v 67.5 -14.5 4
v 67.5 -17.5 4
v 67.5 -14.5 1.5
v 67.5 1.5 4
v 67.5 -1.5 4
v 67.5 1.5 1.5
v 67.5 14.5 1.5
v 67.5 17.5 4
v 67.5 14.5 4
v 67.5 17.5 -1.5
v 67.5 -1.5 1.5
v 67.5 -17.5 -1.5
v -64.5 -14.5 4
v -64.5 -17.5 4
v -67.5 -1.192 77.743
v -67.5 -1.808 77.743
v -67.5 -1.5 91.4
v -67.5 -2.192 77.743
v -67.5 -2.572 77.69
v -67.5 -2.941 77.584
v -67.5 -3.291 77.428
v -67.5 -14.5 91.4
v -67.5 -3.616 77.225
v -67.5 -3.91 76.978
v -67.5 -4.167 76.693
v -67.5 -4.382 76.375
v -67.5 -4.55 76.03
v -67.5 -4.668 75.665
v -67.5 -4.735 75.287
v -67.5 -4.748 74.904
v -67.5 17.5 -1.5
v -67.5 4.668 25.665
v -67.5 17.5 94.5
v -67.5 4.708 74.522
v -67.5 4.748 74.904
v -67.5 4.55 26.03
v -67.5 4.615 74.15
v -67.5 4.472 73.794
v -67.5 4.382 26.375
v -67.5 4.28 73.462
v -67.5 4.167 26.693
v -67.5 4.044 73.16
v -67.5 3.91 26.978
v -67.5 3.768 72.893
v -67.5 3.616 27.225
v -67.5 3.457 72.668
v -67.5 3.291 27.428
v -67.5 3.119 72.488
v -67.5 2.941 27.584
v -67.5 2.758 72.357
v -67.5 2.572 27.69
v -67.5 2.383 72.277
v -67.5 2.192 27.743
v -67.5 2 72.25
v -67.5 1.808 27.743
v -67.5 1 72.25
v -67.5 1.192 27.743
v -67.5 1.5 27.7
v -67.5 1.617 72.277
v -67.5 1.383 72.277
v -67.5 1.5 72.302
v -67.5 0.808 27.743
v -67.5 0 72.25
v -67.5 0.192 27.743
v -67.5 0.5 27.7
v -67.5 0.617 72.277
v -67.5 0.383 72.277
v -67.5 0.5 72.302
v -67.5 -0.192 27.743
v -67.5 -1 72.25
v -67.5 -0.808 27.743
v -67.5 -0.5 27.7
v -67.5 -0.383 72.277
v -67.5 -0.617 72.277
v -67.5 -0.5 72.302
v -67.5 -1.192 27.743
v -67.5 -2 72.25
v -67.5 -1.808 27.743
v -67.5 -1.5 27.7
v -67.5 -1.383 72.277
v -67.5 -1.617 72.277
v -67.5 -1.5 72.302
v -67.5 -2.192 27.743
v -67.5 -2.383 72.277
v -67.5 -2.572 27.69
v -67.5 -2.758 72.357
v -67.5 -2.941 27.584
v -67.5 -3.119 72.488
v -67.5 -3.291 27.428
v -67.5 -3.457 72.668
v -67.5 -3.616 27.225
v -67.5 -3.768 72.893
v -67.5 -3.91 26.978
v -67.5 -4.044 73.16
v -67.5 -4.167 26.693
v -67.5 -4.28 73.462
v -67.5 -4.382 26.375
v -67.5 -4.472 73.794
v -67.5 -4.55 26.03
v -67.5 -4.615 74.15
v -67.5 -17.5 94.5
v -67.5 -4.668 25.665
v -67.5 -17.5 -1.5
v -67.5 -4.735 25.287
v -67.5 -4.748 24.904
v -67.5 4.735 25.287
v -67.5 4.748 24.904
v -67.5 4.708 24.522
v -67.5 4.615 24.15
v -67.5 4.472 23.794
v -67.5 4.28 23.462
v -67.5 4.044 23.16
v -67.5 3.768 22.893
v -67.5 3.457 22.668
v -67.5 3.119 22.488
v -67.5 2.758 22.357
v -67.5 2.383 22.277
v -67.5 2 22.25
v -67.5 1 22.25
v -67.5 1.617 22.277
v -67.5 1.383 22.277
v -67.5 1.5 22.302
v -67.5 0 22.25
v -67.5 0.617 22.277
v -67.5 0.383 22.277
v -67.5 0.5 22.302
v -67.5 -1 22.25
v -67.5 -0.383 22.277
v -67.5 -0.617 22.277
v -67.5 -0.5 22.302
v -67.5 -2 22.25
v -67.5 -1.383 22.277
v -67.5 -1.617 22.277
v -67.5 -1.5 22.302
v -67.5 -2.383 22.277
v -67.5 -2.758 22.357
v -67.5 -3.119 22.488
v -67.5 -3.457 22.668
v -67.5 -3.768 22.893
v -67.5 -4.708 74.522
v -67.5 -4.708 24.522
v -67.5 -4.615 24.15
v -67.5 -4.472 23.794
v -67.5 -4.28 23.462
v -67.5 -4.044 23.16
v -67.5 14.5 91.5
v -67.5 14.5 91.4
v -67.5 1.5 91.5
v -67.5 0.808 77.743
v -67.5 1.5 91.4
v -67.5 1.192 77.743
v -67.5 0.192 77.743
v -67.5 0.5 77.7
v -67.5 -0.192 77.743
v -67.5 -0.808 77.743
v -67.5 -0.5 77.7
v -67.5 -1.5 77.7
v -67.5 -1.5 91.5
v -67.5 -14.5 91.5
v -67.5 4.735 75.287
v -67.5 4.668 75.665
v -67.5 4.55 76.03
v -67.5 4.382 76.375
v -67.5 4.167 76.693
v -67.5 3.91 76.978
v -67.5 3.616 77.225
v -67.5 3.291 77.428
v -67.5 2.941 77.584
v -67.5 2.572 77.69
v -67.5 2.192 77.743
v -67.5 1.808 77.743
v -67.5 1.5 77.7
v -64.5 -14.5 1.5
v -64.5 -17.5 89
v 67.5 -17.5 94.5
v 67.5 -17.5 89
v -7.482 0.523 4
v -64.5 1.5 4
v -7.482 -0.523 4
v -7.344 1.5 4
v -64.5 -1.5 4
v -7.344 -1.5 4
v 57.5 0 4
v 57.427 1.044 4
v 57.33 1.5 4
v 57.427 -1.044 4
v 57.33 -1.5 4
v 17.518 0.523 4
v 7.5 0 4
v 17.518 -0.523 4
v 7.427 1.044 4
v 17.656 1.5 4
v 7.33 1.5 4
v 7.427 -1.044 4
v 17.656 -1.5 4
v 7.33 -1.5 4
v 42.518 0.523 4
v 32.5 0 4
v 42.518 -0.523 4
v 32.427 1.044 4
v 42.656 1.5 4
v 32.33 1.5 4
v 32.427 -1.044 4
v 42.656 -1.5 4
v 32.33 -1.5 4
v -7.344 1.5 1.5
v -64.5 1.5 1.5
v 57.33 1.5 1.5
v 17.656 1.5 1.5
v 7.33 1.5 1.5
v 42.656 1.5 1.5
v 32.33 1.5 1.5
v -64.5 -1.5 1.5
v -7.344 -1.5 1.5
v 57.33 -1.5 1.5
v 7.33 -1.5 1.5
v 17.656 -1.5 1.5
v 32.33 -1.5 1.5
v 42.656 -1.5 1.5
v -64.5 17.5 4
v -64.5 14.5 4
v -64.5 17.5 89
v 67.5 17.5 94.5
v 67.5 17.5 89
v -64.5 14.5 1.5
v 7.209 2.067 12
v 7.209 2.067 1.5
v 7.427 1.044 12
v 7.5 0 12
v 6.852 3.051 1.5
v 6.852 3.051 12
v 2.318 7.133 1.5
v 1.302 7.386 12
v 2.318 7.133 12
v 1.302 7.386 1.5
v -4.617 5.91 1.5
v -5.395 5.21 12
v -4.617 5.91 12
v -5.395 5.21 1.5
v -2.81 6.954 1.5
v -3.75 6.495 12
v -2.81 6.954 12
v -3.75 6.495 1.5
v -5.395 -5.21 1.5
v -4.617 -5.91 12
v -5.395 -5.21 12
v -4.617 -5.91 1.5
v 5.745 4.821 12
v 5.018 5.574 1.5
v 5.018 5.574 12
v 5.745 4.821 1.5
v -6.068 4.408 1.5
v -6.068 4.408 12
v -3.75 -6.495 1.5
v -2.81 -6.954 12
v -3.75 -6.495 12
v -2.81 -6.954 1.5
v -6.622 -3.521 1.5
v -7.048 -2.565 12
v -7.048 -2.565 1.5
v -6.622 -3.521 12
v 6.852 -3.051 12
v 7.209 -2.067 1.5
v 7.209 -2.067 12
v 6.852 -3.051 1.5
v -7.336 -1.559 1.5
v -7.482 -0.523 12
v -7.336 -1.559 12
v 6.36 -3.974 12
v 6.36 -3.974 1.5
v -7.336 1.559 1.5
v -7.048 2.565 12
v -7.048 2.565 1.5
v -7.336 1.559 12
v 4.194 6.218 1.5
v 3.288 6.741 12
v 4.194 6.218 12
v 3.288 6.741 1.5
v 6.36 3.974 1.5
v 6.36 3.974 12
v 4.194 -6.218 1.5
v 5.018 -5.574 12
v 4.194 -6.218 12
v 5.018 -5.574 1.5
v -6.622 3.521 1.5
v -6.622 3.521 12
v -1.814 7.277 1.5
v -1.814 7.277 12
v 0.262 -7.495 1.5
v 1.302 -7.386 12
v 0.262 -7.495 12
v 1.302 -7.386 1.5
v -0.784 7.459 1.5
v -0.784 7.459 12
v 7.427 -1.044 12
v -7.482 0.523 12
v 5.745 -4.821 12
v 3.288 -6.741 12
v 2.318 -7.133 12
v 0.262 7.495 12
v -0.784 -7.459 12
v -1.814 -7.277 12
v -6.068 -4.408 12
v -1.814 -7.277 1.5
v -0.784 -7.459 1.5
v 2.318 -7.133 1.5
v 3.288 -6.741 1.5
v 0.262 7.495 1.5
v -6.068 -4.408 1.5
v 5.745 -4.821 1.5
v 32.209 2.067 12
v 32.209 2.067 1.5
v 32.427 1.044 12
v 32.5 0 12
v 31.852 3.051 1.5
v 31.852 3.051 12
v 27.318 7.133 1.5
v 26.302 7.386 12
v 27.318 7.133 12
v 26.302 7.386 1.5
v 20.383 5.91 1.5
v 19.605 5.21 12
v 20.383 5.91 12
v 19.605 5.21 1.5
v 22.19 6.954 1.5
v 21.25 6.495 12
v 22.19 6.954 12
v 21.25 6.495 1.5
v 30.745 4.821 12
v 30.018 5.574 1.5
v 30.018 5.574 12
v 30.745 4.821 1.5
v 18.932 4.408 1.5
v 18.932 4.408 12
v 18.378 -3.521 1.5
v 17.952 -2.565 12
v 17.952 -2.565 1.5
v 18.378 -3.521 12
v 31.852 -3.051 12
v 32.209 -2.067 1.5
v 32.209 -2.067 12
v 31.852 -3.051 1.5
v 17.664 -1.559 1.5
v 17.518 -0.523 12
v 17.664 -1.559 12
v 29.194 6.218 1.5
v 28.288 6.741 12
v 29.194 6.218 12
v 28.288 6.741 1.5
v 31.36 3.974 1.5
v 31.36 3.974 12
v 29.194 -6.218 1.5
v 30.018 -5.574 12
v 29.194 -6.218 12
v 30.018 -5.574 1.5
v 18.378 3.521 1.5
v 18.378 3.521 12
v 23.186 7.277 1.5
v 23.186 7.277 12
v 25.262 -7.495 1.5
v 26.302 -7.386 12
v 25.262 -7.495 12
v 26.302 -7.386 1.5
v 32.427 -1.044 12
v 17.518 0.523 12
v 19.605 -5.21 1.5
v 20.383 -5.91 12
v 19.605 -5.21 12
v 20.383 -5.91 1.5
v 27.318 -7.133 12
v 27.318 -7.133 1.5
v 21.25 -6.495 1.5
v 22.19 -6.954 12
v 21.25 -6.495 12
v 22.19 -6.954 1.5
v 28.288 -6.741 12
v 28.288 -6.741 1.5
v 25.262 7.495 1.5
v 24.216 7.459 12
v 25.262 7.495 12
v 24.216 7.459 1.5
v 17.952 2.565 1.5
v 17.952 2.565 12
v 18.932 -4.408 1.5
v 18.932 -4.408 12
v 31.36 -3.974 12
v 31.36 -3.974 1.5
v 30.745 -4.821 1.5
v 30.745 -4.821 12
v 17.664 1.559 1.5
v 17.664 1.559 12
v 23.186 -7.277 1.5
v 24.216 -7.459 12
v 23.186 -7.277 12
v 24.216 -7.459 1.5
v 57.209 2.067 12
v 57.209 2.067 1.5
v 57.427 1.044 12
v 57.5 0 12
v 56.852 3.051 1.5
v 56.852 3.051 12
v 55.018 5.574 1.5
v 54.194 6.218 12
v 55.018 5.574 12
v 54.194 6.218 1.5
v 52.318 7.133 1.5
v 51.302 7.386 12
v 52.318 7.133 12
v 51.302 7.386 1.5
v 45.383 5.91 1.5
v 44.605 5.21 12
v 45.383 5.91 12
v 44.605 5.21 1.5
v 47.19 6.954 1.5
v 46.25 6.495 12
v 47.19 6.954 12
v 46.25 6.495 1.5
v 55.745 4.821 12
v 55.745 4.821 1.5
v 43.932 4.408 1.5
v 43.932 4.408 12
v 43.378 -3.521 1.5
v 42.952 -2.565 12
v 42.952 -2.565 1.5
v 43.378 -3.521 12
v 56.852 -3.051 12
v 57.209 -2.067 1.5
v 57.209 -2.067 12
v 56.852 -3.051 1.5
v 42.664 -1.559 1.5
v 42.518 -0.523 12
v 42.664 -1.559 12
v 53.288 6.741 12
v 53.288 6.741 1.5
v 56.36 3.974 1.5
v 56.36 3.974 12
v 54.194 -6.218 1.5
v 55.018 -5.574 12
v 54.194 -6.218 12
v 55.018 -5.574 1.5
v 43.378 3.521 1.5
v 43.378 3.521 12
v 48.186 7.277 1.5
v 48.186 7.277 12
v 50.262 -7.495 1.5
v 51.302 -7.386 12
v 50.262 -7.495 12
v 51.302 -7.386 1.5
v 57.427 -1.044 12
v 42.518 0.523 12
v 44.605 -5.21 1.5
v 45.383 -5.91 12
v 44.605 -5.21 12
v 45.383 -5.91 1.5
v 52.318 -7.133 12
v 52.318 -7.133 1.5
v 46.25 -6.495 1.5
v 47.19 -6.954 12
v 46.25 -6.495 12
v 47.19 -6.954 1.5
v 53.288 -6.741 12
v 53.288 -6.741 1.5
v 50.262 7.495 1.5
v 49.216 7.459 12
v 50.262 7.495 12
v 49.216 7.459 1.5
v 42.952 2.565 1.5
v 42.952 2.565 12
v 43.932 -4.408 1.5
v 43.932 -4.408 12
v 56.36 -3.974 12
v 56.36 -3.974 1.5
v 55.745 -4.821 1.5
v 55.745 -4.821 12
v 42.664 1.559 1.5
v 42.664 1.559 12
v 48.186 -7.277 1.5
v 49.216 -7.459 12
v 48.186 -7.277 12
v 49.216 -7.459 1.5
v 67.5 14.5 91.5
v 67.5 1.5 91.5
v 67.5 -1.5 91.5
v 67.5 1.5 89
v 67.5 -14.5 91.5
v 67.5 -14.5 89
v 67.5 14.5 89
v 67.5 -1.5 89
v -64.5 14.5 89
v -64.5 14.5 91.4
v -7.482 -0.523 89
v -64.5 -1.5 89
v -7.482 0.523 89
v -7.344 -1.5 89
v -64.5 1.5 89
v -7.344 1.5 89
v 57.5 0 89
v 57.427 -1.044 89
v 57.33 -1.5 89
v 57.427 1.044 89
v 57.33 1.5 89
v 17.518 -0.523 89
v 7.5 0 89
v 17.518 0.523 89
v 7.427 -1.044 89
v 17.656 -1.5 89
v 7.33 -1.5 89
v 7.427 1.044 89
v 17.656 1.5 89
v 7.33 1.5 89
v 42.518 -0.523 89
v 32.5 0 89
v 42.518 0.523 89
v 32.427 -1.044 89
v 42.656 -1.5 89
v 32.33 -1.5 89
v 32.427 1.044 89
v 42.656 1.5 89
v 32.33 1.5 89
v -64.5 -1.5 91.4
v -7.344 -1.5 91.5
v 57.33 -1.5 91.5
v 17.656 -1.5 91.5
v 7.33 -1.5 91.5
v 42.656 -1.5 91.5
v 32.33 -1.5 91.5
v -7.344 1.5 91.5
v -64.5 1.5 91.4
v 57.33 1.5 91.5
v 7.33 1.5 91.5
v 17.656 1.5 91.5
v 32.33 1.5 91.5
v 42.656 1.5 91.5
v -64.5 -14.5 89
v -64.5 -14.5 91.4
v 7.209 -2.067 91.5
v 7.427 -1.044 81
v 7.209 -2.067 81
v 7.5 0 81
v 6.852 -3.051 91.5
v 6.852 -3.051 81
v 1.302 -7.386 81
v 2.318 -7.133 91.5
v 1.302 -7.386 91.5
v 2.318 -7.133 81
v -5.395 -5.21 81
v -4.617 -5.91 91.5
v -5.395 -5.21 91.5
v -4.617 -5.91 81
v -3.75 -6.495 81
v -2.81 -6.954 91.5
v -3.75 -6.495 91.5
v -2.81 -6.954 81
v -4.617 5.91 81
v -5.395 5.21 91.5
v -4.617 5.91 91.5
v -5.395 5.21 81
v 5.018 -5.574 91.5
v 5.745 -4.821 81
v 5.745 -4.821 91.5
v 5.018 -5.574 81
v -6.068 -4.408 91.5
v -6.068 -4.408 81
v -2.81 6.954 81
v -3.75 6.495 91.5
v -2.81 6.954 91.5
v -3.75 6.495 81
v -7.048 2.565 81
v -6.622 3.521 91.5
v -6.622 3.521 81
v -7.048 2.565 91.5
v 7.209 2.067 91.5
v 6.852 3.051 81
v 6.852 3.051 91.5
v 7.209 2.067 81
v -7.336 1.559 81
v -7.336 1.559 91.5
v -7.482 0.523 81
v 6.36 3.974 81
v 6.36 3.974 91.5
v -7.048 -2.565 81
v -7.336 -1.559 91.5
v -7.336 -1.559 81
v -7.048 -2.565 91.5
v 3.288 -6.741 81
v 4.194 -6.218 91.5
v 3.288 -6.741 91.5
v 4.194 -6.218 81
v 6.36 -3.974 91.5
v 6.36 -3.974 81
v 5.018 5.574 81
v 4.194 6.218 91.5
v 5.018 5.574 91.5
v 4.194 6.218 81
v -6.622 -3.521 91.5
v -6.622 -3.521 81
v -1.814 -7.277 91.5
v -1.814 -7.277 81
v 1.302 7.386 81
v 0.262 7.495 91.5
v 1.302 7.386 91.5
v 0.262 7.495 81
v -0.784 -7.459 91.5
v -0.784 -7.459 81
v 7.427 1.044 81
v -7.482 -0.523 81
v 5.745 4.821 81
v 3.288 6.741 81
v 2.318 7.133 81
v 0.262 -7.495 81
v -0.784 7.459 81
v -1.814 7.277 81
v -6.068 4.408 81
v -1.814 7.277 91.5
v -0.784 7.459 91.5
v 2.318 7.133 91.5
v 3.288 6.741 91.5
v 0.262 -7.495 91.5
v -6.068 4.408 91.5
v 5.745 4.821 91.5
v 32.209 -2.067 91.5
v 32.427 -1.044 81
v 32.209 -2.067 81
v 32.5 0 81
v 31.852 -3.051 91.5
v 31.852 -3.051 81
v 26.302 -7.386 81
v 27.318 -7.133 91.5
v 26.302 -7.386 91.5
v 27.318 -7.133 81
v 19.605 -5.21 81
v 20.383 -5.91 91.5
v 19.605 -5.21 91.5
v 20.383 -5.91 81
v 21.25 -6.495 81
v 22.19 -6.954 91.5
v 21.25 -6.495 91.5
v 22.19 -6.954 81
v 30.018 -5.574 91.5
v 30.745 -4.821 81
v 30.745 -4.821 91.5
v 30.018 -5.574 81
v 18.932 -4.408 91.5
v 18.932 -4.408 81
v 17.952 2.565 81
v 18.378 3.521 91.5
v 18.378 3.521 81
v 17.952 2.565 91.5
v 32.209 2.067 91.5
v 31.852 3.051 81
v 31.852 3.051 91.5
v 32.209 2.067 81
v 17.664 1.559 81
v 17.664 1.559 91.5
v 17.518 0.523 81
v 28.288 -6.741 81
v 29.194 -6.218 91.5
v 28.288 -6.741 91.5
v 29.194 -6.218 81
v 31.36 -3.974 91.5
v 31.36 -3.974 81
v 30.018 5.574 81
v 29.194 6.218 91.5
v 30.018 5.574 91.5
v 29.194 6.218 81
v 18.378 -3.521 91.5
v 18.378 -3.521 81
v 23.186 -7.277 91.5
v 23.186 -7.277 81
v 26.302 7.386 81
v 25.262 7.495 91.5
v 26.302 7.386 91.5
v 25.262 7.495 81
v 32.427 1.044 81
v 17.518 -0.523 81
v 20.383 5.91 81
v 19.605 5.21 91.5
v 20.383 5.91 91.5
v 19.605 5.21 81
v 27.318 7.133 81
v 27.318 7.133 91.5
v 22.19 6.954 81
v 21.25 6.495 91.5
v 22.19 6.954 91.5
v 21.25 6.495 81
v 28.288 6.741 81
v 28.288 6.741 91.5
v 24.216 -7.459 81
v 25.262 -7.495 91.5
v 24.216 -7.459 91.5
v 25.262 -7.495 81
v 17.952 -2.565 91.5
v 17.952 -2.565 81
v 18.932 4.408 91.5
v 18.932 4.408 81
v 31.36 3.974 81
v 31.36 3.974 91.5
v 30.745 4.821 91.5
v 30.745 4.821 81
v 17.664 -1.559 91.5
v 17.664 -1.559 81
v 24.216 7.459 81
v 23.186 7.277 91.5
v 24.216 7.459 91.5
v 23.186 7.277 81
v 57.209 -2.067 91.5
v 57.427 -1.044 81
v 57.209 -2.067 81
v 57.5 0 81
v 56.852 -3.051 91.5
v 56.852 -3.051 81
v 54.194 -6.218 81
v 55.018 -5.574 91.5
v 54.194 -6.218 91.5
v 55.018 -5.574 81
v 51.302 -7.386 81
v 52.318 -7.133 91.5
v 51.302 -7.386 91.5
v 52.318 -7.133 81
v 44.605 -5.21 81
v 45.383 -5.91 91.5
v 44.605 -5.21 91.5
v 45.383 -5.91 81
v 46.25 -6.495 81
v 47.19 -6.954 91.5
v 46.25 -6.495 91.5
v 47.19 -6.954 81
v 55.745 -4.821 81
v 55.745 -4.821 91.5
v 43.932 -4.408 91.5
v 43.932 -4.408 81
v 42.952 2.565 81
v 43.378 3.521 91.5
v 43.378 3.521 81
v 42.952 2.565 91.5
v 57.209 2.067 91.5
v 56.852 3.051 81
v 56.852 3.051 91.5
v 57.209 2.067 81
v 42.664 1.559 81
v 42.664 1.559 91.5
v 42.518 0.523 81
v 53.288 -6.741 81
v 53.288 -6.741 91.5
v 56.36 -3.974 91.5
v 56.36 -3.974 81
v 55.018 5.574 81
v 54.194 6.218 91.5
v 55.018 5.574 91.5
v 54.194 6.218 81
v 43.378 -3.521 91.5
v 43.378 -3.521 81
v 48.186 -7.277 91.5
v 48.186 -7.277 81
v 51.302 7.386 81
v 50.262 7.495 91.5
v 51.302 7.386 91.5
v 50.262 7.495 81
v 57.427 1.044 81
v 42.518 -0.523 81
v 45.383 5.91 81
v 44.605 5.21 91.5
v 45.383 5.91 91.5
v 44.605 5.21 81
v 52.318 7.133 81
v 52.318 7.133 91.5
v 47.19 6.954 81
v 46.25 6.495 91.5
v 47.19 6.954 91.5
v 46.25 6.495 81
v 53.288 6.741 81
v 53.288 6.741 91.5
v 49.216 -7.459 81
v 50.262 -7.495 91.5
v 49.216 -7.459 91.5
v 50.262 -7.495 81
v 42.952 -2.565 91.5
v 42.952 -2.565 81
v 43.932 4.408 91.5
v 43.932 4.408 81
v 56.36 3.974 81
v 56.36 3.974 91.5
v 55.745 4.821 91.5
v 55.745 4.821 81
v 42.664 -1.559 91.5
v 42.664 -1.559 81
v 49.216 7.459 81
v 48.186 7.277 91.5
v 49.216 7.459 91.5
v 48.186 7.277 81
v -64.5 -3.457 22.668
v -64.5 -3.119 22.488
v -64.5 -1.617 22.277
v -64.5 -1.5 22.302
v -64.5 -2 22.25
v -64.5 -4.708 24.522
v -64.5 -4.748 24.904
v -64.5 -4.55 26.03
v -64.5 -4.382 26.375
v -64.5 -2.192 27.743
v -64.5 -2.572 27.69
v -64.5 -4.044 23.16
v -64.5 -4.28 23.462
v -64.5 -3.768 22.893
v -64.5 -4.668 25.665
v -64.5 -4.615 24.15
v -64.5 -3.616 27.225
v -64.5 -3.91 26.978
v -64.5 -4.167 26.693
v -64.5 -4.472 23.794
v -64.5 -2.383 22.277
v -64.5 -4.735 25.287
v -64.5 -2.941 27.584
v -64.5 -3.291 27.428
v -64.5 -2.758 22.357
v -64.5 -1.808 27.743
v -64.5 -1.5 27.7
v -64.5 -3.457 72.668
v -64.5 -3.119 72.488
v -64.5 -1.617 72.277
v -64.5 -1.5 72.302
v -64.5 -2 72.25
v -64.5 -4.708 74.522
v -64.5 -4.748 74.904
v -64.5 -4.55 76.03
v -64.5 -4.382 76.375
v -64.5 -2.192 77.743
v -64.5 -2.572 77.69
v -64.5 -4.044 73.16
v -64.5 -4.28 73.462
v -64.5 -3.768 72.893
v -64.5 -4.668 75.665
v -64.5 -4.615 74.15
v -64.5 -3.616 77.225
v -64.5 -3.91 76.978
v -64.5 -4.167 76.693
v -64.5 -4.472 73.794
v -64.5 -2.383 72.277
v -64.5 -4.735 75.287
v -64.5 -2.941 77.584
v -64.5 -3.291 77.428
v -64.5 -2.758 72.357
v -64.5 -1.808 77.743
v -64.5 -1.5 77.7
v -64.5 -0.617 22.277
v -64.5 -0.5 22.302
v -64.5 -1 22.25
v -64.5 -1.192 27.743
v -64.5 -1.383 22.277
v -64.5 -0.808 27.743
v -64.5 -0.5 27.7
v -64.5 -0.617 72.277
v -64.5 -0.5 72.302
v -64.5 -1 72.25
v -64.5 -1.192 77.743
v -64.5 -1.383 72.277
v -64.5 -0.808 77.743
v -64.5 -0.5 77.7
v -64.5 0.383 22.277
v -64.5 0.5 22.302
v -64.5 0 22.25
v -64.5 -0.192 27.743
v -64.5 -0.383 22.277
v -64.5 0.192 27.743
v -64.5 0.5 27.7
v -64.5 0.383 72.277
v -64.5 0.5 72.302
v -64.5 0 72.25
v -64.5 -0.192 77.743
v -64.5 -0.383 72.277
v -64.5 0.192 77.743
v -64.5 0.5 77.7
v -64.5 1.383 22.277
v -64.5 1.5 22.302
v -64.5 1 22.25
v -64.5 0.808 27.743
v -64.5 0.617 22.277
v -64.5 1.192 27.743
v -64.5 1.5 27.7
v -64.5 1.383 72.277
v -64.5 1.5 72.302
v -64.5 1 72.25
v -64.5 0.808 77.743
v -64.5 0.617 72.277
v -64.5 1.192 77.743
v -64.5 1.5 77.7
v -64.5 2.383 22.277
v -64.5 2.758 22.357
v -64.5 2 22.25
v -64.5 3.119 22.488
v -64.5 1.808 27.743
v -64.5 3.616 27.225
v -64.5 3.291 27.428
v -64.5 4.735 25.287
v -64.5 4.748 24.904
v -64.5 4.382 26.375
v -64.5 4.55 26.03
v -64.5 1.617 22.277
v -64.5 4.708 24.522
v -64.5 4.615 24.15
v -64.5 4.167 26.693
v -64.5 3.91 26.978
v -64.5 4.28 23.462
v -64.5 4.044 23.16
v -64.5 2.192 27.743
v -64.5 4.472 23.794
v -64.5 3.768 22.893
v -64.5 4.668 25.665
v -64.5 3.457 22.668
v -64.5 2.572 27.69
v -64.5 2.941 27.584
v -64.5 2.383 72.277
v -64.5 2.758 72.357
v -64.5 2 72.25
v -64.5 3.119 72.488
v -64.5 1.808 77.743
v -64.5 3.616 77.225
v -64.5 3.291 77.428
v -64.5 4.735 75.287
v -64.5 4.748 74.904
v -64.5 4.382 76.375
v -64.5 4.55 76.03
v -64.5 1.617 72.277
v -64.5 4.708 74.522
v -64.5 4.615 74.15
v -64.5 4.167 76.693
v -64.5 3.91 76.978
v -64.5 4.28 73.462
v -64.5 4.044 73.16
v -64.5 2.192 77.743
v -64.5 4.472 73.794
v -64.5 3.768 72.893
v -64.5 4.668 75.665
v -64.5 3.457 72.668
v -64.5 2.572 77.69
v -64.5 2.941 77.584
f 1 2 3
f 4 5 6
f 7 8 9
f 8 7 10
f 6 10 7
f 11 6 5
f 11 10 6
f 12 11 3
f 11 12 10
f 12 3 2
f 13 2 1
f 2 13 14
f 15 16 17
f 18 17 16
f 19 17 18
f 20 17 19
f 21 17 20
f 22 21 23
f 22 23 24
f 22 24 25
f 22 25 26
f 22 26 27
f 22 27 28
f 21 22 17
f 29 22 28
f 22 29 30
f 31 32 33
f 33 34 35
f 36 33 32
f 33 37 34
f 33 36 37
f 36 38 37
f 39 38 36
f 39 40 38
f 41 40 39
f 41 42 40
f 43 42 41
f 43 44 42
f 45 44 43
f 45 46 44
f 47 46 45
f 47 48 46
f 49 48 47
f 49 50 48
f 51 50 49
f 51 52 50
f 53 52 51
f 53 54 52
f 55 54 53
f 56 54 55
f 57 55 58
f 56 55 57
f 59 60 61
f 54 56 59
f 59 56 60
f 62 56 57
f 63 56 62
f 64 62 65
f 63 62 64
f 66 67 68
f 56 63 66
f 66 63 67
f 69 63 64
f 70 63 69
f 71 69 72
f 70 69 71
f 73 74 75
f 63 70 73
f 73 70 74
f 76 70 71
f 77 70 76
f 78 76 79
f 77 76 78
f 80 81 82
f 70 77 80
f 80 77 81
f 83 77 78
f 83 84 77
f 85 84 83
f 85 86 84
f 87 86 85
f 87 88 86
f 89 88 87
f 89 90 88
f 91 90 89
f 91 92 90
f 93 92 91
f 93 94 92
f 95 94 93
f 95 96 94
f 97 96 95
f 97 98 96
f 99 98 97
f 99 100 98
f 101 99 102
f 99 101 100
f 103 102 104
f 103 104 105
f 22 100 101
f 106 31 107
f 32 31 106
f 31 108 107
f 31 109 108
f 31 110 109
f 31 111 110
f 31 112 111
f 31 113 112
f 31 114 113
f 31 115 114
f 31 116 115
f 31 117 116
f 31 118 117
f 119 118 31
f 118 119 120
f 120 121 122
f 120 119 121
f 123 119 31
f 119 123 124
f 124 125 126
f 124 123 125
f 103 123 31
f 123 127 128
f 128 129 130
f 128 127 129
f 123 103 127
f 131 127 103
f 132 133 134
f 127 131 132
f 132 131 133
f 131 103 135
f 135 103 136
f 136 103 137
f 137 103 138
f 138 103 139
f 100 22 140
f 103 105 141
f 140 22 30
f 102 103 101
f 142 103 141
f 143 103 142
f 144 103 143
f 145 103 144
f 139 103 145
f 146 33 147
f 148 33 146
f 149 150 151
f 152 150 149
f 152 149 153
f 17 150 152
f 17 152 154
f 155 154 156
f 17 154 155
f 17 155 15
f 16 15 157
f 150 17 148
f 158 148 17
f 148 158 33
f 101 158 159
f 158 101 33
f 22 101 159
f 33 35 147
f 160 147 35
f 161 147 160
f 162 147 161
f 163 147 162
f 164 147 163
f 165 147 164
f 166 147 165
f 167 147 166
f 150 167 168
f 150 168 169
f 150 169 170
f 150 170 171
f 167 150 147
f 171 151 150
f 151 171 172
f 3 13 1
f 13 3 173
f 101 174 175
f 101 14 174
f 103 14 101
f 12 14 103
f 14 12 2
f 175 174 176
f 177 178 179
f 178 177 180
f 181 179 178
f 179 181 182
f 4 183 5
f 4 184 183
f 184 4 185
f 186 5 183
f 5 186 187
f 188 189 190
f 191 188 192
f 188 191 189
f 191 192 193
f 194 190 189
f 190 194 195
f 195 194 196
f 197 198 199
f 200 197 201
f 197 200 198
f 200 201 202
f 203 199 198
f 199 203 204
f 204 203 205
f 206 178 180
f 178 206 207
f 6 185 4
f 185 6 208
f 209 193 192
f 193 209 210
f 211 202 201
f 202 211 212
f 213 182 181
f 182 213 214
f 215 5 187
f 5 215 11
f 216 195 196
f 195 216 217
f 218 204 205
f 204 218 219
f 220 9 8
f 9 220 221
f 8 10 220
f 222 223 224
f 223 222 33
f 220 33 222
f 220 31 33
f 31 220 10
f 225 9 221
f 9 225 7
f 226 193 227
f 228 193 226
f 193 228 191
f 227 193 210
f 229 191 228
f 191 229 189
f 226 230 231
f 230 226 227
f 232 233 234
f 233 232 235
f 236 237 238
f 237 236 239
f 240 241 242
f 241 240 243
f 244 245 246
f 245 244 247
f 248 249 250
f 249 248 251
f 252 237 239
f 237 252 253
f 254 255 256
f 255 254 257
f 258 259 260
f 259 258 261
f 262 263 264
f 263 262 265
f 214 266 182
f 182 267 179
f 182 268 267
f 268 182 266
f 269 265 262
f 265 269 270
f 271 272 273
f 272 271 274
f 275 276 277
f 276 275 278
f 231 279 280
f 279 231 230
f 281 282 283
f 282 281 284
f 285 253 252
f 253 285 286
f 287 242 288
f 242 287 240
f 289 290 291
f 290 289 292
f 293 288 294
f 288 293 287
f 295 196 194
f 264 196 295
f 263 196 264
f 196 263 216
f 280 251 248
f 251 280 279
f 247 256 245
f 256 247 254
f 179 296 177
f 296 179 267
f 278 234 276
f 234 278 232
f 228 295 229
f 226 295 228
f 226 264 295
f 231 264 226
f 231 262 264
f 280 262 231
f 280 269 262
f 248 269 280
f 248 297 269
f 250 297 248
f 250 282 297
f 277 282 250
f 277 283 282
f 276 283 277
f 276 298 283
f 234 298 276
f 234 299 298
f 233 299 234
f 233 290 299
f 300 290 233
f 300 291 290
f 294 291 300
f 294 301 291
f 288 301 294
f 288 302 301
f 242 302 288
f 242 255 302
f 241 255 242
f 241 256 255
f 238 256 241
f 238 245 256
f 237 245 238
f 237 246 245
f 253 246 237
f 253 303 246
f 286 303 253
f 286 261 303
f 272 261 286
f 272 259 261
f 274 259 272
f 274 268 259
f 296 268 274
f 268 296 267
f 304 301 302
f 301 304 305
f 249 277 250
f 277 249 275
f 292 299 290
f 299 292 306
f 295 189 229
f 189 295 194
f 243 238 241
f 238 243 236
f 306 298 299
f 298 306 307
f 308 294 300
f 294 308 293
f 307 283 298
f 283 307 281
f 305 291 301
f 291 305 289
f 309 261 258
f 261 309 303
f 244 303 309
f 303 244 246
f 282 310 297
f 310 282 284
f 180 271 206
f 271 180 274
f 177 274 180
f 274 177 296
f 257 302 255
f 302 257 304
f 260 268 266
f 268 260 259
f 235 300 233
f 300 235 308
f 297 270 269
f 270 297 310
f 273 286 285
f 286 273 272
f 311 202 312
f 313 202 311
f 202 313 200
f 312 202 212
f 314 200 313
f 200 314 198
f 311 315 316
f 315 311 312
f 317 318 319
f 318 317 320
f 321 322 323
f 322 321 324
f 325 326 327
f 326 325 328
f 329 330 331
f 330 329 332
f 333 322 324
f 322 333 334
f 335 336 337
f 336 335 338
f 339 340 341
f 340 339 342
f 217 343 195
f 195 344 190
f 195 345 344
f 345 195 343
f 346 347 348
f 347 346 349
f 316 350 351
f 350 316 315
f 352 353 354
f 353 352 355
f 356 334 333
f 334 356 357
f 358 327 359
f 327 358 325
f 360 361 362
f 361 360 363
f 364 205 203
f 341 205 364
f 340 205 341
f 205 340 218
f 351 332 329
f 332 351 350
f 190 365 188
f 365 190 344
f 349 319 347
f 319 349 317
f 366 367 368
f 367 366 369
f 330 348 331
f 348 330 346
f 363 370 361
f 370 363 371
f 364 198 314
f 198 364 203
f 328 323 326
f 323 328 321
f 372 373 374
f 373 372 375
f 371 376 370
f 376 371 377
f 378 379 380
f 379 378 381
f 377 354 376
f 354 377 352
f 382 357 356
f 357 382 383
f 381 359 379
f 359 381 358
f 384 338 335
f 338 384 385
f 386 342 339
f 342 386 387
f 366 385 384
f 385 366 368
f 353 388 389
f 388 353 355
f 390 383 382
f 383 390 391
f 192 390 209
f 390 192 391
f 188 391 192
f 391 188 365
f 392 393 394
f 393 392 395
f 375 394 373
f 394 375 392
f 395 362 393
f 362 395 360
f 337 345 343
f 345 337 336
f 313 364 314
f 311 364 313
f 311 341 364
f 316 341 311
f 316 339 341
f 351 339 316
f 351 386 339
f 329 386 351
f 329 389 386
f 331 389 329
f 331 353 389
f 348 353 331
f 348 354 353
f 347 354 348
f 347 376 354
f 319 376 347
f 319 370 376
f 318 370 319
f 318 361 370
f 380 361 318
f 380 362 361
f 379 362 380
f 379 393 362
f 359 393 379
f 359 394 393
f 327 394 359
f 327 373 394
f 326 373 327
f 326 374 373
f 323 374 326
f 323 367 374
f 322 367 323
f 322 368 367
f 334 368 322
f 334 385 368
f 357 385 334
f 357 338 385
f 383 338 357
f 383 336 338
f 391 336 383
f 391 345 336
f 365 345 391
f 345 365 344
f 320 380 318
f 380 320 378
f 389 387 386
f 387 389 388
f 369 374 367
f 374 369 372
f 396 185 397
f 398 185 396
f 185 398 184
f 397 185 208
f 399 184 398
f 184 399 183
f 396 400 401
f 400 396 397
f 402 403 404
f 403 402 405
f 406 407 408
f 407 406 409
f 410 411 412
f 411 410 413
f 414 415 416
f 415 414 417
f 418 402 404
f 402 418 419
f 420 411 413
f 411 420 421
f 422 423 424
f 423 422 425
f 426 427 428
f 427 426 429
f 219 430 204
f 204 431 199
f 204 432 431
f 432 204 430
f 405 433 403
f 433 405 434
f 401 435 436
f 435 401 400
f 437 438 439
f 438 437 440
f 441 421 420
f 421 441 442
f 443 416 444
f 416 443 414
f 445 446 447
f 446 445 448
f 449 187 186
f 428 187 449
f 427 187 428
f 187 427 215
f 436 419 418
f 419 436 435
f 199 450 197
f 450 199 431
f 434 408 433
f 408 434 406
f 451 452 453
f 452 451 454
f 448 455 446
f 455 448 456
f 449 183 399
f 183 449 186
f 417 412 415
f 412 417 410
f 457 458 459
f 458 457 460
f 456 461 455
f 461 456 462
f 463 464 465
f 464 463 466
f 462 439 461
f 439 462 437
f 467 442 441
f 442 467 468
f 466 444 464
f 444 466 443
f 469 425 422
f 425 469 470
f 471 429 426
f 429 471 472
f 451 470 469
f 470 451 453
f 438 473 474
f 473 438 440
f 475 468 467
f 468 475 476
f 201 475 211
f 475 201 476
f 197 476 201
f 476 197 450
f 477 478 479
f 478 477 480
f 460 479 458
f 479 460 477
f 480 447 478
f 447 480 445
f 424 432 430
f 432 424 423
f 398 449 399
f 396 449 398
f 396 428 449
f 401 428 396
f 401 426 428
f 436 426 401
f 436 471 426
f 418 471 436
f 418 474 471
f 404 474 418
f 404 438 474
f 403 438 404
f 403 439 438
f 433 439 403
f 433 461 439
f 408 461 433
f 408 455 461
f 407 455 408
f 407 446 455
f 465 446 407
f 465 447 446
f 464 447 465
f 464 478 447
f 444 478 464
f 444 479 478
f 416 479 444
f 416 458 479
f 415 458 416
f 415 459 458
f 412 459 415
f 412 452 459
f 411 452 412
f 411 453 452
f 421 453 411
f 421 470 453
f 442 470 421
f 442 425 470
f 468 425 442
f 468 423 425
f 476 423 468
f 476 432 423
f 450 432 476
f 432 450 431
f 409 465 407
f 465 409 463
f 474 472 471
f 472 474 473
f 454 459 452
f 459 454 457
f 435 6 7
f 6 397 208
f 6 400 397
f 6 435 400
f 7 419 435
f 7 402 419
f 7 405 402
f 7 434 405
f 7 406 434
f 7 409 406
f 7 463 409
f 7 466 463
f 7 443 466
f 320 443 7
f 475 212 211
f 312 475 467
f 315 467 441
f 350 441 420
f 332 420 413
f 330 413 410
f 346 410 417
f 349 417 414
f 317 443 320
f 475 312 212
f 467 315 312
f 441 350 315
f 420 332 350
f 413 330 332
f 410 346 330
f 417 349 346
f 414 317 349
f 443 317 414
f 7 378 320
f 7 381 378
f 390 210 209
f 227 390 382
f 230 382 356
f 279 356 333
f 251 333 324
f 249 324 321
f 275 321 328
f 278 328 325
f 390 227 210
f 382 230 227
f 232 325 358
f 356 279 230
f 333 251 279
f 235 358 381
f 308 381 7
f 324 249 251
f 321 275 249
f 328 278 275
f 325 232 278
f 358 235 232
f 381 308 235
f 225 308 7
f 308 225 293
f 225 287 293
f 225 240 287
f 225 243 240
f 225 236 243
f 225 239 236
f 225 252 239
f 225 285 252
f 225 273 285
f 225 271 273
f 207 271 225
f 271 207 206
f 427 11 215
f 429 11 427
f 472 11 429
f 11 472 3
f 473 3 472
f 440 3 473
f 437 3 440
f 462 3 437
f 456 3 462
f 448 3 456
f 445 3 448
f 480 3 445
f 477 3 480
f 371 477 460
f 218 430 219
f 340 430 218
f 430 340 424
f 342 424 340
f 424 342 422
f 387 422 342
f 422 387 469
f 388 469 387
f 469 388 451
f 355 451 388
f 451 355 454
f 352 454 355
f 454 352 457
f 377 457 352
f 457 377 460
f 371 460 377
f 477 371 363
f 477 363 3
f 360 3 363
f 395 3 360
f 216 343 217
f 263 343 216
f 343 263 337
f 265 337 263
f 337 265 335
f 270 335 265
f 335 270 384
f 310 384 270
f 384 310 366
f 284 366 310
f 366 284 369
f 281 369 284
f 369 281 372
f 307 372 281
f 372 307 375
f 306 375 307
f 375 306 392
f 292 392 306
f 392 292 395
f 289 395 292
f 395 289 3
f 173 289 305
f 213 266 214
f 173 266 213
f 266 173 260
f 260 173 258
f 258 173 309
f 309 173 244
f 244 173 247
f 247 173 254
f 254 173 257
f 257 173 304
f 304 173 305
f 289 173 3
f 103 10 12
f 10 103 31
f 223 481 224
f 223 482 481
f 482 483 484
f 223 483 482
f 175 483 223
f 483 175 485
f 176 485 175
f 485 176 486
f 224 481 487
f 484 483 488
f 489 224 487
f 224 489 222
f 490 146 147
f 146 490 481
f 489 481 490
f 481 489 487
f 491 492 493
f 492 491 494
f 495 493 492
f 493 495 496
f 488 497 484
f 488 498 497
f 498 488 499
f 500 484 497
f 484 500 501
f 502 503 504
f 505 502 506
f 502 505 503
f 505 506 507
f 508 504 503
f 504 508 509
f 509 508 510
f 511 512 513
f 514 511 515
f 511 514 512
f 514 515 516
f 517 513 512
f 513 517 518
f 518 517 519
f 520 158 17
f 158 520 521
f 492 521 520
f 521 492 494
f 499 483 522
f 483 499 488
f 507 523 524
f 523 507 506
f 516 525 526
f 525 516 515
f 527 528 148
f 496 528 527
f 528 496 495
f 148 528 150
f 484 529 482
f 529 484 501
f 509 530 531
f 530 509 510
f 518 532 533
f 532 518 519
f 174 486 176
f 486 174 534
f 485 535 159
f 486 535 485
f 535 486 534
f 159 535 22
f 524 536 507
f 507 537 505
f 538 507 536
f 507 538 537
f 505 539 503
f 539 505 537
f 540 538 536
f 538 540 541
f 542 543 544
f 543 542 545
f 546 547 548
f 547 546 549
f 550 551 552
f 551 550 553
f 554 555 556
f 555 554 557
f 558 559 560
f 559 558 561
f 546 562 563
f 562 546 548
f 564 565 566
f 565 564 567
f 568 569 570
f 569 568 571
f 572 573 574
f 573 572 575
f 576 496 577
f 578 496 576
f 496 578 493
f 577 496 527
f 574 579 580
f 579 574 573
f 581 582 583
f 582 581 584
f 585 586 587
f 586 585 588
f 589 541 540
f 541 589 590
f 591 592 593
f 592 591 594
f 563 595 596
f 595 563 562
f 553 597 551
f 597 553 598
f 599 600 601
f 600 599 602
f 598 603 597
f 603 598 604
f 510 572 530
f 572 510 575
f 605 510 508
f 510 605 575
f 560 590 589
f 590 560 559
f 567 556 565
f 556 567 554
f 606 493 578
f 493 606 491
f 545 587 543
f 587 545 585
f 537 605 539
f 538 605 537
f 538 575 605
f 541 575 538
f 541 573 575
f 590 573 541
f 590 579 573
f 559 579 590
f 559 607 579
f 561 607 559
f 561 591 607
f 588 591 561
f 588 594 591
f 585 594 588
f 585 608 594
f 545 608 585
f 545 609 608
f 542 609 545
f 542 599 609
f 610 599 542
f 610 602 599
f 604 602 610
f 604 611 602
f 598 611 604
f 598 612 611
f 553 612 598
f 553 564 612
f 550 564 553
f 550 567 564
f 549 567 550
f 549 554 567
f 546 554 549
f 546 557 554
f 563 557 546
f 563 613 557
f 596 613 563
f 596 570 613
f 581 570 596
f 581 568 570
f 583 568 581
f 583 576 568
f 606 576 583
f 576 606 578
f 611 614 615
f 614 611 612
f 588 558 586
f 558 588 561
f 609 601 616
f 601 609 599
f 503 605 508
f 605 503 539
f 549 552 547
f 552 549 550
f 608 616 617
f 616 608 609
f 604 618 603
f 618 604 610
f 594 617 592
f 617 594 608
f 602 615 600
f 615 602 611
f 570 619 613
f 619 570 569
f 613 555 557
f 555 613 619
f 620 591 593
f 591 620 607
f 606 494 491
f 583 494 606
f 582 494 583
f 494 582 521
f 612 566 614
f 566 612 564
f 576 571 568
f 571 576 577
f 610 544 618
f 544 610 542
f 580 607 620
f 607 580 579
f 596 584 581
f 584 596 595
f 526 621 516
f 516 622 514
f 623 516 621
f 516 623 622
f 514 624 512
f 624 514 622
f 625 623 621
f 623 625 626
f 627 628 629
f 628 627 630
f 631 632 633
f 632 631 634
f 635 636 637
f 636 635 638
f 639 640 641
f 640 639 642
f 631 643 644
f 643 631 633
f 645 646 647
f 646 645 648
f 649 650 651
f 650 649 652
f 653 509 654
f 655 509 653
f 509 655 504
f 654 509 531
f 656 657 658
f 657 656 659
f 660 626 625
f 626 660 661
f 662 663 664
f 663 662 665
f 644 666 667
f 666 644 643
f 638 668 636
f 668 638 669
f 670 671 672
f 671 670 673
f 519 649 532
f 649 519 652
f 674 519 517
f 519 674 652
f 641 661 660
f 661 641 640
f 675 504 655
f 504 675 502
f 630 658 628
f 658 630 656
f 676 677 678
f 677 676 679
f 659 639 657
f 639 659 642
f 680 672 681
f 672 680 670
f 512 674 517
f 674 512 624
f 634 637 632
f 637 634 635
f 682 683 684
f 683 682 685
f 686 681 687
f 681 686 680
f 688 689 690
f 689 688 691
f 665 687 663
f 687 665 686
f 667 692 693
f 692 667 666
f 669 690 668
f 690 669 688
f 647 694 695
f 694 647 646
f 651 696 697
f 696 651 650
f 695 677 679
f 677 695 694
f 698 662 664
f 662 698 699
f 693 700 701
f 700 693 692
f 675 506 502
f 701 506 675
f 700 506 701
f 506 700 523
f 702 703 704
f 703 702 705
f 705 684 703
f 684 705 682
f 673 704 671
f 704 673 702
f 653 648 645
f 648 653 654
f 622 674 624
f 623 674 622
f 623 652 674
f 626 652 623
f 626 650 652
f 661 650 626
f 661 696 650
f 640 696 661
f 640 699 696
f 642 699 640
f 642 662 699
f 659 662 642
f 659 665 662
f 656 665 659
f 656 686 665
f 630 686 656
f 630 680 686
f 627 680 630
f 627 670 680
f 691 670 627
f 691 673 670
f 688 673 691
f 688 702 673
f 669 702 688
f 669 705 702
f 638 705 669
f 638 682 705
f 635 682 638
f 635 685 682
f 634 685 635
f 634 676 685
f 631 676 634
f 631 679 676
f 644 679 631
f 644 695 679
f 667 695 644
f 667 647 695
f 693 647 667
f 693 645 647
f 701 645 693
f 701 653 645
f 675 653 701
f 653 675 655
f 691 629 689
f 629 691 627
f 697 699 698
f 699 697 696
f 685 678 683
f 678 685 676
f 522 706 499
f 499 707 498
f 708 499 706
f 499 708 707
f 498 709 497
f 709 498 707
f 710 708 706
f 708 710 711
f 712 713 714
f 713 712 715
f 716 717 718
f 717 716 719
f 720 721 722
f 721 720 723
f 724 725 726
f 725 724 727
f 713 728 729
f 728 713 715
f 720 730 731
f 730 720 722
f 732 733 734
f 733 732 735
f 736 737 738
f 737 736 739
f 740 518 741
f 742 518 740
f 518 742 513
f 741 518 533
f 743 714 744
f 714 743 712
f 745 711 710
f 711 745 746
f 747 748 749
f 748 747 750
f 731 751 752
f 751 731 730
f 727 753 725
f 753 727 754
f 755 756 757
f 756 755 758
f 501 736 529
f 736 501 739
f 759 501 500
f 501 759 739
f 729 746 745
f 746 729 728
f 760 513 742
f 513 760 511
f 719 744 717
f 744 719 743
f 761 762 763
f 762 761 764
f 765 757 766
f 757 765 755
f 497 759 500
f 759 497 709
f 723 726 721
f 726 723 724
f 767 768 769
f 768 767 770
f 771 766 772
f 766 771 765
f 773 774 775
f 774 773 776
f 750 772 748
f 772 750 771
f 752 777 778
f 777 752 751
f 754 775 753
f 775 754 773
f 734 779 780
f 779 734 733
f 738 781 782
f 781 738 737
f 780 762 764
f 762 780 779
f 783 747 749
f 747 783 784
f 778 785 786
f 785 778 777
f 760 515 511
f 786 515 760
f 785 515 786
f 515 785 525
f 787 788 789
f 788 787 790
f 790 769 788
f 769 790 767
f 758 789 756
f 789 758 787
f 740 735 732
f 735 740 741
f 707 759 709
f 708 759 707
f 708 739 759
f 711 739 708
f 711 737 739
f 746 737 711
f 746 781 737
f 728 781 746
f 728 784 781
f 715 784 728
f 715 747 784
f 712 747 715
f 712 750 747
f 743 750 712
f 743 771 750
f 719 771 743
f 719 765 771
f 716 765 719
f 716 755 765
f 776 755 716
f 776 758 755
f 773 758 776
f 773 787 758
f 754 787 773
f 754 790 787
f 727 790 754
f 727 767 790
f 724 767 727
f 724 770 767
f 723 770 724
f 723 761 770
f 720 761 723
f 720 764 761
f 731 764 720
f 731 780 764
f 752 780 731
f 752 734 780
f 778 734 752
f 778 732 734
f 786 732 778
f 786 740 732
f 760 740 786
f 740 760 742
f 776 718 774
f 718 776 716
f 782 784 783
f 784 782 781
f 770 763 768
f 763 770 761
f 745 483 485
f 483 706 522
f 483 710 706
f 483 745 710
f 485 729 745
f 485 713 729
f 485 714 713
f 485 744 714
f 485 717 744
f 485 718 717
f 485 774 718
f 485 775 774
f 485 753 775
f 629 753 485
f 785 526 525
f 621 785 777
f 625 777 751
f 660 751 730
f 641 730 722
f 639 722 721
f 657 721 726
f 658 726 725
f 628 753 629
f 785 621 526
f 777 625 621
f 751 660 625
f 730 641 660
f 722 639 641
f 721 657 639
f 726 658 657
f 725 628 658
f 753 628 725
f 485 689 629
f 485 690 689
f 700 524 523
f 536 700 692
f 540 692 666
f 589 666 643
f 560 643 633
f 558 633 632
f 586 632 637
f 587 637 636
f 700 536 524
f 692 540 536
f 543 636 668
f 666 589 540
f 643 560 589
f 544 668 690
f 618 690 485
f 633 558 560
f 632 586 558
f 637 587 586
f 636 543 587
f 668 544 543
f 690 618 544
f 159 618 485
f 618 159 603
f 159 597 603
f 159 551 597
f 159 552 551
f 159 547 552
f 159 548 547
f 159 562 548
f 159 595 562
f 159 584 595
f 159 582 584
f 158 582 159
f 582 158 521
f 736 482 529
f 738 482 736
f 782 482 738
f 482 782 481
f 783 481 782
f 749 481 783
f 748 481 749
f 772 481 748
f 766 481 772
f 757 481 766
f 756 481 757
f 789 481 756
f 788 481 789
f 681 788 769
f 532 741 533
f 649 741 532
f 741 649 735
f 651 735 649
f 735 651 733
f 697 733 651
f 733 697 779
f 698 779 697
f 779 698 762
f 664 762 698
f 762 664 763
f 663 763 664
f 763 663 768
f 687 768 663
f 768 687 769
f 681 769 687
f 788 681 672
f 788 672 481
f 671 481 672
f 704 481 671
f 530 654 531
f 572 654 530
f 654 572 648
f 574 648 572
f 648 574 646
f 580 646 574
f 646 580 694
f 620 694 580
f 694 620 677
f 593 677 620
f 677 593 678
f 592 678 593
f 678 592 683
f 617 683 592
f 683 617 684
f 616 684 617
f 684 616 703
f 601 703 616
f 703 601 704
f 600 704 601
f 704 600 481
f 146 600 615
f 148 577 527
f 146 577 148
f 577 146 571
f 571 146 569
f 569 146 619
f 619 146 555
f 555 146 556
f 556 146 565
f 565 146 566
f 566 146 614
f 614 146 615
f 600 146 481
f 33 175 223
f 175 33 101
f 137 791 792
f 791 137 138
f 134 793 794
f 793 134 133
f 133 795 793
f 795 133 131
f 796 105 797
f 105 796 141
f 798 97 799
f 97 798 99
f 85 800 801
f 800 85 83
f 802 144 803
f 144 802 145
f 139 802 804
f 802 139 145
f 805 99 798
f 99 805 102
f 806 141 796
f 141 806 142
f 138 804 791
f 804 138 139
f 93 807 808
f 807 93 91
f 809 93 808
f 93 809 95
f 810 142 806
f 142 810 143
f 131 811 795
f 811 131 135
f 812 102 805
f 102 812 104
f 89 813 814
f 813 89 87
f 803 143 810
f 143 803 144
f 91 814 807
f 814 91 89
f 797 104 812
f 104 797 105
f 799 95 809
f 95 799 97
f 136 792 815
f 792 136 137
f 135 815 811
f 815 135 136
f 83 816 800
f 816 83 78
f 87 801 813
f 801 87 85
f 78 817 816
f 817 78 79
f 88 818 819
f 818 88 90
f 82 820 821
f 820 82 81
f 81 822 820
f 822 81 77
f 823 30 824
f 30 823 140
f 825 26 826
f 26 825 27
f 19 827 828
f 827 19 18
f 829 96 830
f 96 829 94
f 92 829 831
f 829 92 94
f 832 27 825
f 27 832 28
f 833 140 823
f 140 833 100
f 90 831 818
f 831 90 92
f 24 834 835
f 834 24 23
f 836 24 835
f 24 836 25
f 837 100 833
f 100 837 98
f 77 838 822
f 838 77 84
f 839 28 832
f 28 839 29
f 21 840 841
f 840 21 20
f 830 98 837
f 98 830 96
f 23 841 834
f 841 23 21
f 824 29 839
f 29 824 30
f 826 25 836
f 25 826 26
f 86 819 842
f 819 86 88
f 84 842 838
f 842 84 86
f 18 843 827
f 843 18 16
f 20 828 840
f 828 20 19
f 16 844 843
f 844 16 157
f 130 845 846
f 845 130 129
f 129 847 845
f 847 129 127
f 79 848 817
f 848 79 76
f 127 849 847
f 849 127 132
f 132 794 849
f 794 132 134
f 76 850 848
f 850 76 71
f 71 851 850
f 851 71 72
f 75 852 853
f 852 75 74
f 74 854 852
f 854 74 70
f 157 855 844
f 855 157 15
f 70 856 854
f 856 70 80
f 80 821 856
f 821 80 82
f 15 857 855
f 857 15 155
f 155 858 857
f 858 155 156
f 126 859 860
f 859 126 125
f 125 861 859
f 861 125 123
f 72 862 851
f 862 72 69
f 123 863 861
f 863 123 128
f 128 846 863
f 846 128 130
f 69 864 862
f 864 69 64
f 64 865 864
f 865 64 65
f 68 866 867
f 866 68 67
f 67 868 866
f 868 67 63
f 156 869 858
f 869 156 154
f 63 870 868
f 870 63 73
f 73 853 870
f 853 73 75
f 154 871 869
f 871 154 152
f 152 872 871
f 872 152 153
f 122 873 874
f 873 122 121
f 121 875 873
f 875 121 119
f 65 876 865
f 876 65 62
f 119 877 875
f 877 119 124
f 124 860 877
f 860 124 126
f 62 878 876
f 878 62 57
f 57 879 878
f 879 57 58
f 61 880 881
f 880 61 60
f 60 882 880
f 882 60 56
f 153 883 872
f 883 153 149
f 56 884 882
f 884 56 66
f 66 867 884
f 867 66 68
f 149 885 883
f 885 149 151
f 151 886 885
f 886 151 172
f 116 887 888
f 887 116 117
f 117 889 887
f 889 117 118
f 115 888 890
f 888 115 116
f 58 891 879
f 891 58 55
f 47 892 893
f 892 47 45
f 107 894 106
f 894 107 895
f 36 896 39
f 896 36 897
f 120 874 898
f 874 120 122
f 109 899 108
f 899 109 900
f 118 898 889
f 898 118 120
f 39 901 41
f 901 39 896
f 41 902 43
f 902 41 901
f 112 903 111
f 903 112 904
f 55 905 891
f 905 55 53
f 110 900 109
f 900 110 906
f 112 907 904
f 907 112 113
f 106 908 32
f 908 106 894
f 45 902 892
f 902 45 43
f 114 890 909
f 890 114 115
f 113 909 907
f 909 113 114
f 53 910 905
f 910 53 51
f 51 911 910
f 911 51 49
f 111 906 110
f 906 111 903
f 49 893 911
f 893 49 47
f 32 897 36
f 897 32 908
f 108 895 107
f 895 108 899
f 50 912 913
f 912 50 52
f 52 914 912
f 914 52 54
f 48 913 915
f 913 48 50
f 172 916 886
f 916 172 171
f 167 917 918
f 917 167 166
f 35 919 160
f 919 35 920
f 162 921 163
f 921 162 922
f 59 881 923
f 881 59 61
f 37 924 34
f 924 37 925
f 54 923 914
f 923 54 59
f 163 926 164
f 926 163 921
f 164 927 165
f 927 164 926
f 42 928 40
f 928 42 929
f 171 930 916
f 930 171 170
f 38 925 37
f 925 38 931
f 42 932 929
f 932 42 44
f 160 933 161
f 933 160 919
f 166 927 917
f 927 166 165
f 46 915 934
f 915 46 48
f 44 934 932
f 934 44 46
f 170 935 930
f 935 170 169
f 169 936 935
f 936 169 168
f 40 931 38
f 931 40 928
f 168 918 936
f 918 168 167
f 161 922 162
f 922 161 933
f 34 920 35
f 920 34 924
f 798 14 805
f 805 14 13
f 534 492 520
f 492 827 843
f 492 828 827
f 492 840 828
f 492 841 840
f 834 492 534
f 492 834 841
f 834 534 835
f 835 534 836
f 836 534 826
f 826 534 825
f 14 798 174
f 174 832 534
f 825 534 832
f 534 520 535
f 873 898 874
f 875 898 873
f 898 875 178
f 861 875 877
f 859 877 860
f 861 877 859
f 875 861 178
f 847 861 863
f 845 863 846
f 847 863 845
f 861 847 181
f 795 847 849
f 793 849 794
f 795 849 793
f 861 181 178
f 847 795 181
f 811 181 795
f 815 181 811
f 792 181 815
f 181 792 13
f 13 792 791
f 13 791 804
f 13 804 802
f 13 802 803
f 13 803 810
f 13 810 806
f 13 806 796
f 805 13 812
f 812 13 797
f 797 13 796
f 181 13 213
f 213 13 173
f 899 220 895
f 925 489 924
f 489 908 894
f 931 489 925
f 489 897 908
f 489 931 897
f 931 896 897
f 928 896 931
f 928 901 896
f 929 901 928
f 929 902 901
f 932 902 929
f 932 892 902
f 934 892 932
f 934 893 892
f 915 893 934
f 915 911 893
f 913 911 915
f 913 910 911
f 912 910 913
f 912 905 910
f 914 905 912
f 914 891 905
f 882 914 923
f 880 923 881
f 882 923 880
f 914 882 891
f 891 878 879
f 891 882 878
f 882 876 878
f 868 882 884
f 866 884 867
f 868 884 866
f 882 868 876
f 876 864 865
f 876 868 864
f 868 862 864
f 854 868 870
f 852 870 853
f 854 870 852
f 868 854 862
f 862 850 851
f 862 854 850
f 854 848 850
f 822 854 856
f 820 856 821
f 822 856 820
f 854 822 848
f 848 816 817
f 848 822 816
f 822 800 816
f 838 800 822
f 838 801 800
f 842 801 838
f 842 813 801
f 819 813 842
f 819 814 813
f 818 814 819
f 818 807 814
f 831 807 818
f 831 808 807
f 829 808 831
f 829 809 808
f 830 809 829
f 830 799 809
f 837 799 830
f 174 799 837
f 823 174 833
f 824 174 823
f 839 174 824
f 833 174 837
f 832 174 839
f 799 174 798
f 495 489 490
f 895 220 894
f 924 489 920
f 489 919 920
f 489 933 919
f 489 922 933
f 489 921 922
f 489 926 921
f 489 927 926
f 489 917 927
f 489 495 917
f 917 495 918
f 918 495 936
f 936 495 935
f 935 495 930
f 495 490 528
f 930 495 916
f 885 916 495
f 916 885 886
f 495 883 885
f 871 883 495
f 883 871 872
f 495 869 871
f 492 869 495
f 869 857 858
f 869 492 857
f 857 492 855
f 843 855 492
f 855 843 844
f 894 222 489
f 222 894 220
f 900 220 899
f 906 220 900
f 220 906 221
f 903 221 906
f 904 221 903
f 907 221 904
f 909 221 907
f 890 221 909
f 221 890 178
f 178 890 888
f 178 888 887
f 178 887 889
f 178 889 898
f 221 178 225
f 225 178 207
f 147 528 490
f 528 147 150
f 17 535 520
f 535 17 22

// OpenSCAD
// generally, how thick will the bracket be?
thickness = 3;



hanging_height = 135;
hanging_width = 90;

mounting_bracket_width = 90;
mounting_bracket_length = 35;
mounting_bracket_hole_diameter = 5.5;
mounting_bracket_hole_pos_1 = 25;
mounting_bracket_hole_pos_2 = 75;

container_width = 100;

spindle_diameter = 20;
spindle_clearance = 5;  // fudge factor to adjust clearance of spindle with sides

// TOTAL spindle length, straight and angled parts
spindle_length = container_width - thickness - spindle_clearance;

spindle_angled_part_height = 7;  // angled bits of the spindle

sdheight = spindle_diameter/3;


spindle_mount_diameter = 15;
spindle_mount_height = 12; // more like 15!
spindle_mount_step = 25;

/*
 *  A spool holder to use in a dry box made from
 *
 *  "ME.FAN EXTRA LARGE Cereal Storage Containers 
 *  [Set of 2] Airtight Food Storage Containers 
 *  6.3L(213oz) - Large Kitchen Storage Keeper 
 *  with 24 Chalkboard Labels & Pen - Easy 
 *  Pouring Lid (Blue)" 
 *
 *  https://www.amazon.com/gp/product/B085ZBCLLN
 *  (As of 8/29/2020)
 *
 *  Dimensions are roughly 
 *  11 inches x 11.2 inches x 3.94 inches
 *
 *  Dry box parts will all mount into the lid to make
 *  it more convenient to interchange spools.
 *
 */
module hangingSpoolHolder() {
    module spindleMount() {
        translate([0,0,spindle_mount_height/2])
        cylinder(d=spindle_mount_diameter,
            h=spindle_mount_height,
            center=true);
    }
    
    // The part that hangs down into the container
    module hangingPart() {
        cube([hanging_height,mounting_bracket_length,thickness], center=true);
        mbl2 = mounting_bracket_length/2;
        hh = sdheight*0.7;
        for (y = [-mbl2+(thickness/2),0,mbl2-(thickness/2)]) {
            translate([0,y,hh-thickness]) 
                cube([hanging_height,thickness,hh],center=true);
        }
        for (x=[0:spindle_mount_step:(hanging_height/2)-(spindle_mount_step/2)]) {
            translate([x,0,0]) spindleMount();
        }
    }
    
    // Holes in the part that hangs down into the container
    // (saves material, and a little print time) 
    module hangingPartHoles() {
        //translate([-8,0,0])
        //cube([hanging_height*0.7, mounting_bracket_length*0.7,1000], center=true);
        
        //n = 16;
        //for (x=[-(hanging_height/2)+(2*n):n:(hanging_height/2)-(2*n)]) {
        //    translate([x,mounting_bracket_length/4.5,0]) 
        //        cylinder(d=n/2, h=1000, center=true);
        //    translate([x,-mounting_bracket_length/4.5,0]) 
        //        cylinder(d=n/2, h=1000, center=true);
        //}
    }
    
    // The round part for the filament spool to sit on
    module spindle(hAngledPart=10) {
        sdbase = spindle_diameter * 1.5;
        /*
        //sdheight = spindle_diameter/3;
        //translate([
        //        (hanging_height/2)-(sdbase/2),
        //        0,
        //        (spindle_length/2)+(thickness/2)-0.1])
        translate([(hanging_height/2)-(sdbase/2),0,(spindle_length/2)+(thickness/2)])
            cylinder(d=spindle_diameter, h=spindle_length+(thickness/2), center=true);
        //translate([
        //        (hanging_height/2)-(sdbase/2),
        //        0,
        //        (sdheight/2)+(thickness/2)-0.1])
            //cylinder(d1=sdbase, d2=spindle_diameter, h=sdheight, center=true);
        */
         saph = spindle_angled_part_height;
         ssph = spindle_length - ( 2 * saph);
         fudge_factor = 0.5;
         translate([(hanging_height/2)-(sdbase/2),0,(ssph/2)+(2*saph)-(thickness/2)-fudge_factor])
         union() {
            cylinder(d=spindle_diameter, 
                h=ssph, 
                center=true);
            zz = (ssph/2)+(saph/2);
            translate([0,0,zz]) 
                cylinder(d1=spindle_diameter, d2=spindle_diameter*1.3, h=saph ,center=true);
            translate([0,0,-zz]) 
                cylinder(d2=spindle_diameter, d1=spindle_diameter*1.3, h=saph ,center=true);
        }
    }
    
    // The part that will screw into the lid of the container
    module mountingBracket() {
        t1 = thickness; // * 1.5;
        translate([
                -(hanging_height/2)+(t1/2),
                0,
                (mounting_bracket_width/2)+(thickness/2)-0.1])
            cube([t1,mounting_bracket_length, mounting_bracket_width], center=true);
        
        //rs = thickness*1.2;
        // reinforcement for the corner
        //translate([
        //        -(hanging_height/2)+(rs/2),
        //        0,
        //        (rs/2)+(thickness/2)-0.1])
        //    cube([rs,mounting_bracket_length, rs], center=true);
        
        //foo = 8;
        //fez = 3*foo;
        //bar = (mounting_bracket_length/2) - (thickness/2);
        //for (y=[-bar, bar]) {
        //    translate([-(hanging_height/2)+thickness+foo/2,y,(hanging_width/2)+(thickness/2)])
        //        cube([foo,thickness,hanging_width],center=true);
        //    translate([-(hanging_height/2)+thickness+fez/2,y,(fez/2)+(thickness/2)])
        //        cube([fez,thickness,fez],center=true);
        //}
    }
    
    // Holes for the screws for attaching the mounting bracket to the lid
    // FIXME: Center the holes on next generation.
    // (Can't fix for this one, container is already drilled!)
    module mountingBracketHoles() {
        for (y=[-2:1:2]) {  // really VERY sub-optimal.
            rotate([0,90,0]) {
                union() {
                    translate([-mounting_bracket_hole_pos_1,y,0])
                        cylinder(d=mounting_bracket_hole_diameter,h=1000, center=true);
                    translate([-mounting_bracket_hole_pos_2,y,0])
                        cylinder(d=mounting_bracket_hole_diameter,h=1000, center=true);
                }
            }
        }
    }
    
    // Put all the pieces together!
    union() {
        translate([0,0,0]) hangingPart();
        translate([0,0,mounting_bracket_width+thickness]) 
            rotate([0,180,180]) hangingPart();
        //difference() {
        //    hangingPart();
        //    hangingPartHoles();
        //}
        //rotate([0,-2,0])spindle();
        difference() {
            mountingBracket();
            mountingBracketHoles();
        }
    }
    
}

hangingSpoolHolder($fn=45);
